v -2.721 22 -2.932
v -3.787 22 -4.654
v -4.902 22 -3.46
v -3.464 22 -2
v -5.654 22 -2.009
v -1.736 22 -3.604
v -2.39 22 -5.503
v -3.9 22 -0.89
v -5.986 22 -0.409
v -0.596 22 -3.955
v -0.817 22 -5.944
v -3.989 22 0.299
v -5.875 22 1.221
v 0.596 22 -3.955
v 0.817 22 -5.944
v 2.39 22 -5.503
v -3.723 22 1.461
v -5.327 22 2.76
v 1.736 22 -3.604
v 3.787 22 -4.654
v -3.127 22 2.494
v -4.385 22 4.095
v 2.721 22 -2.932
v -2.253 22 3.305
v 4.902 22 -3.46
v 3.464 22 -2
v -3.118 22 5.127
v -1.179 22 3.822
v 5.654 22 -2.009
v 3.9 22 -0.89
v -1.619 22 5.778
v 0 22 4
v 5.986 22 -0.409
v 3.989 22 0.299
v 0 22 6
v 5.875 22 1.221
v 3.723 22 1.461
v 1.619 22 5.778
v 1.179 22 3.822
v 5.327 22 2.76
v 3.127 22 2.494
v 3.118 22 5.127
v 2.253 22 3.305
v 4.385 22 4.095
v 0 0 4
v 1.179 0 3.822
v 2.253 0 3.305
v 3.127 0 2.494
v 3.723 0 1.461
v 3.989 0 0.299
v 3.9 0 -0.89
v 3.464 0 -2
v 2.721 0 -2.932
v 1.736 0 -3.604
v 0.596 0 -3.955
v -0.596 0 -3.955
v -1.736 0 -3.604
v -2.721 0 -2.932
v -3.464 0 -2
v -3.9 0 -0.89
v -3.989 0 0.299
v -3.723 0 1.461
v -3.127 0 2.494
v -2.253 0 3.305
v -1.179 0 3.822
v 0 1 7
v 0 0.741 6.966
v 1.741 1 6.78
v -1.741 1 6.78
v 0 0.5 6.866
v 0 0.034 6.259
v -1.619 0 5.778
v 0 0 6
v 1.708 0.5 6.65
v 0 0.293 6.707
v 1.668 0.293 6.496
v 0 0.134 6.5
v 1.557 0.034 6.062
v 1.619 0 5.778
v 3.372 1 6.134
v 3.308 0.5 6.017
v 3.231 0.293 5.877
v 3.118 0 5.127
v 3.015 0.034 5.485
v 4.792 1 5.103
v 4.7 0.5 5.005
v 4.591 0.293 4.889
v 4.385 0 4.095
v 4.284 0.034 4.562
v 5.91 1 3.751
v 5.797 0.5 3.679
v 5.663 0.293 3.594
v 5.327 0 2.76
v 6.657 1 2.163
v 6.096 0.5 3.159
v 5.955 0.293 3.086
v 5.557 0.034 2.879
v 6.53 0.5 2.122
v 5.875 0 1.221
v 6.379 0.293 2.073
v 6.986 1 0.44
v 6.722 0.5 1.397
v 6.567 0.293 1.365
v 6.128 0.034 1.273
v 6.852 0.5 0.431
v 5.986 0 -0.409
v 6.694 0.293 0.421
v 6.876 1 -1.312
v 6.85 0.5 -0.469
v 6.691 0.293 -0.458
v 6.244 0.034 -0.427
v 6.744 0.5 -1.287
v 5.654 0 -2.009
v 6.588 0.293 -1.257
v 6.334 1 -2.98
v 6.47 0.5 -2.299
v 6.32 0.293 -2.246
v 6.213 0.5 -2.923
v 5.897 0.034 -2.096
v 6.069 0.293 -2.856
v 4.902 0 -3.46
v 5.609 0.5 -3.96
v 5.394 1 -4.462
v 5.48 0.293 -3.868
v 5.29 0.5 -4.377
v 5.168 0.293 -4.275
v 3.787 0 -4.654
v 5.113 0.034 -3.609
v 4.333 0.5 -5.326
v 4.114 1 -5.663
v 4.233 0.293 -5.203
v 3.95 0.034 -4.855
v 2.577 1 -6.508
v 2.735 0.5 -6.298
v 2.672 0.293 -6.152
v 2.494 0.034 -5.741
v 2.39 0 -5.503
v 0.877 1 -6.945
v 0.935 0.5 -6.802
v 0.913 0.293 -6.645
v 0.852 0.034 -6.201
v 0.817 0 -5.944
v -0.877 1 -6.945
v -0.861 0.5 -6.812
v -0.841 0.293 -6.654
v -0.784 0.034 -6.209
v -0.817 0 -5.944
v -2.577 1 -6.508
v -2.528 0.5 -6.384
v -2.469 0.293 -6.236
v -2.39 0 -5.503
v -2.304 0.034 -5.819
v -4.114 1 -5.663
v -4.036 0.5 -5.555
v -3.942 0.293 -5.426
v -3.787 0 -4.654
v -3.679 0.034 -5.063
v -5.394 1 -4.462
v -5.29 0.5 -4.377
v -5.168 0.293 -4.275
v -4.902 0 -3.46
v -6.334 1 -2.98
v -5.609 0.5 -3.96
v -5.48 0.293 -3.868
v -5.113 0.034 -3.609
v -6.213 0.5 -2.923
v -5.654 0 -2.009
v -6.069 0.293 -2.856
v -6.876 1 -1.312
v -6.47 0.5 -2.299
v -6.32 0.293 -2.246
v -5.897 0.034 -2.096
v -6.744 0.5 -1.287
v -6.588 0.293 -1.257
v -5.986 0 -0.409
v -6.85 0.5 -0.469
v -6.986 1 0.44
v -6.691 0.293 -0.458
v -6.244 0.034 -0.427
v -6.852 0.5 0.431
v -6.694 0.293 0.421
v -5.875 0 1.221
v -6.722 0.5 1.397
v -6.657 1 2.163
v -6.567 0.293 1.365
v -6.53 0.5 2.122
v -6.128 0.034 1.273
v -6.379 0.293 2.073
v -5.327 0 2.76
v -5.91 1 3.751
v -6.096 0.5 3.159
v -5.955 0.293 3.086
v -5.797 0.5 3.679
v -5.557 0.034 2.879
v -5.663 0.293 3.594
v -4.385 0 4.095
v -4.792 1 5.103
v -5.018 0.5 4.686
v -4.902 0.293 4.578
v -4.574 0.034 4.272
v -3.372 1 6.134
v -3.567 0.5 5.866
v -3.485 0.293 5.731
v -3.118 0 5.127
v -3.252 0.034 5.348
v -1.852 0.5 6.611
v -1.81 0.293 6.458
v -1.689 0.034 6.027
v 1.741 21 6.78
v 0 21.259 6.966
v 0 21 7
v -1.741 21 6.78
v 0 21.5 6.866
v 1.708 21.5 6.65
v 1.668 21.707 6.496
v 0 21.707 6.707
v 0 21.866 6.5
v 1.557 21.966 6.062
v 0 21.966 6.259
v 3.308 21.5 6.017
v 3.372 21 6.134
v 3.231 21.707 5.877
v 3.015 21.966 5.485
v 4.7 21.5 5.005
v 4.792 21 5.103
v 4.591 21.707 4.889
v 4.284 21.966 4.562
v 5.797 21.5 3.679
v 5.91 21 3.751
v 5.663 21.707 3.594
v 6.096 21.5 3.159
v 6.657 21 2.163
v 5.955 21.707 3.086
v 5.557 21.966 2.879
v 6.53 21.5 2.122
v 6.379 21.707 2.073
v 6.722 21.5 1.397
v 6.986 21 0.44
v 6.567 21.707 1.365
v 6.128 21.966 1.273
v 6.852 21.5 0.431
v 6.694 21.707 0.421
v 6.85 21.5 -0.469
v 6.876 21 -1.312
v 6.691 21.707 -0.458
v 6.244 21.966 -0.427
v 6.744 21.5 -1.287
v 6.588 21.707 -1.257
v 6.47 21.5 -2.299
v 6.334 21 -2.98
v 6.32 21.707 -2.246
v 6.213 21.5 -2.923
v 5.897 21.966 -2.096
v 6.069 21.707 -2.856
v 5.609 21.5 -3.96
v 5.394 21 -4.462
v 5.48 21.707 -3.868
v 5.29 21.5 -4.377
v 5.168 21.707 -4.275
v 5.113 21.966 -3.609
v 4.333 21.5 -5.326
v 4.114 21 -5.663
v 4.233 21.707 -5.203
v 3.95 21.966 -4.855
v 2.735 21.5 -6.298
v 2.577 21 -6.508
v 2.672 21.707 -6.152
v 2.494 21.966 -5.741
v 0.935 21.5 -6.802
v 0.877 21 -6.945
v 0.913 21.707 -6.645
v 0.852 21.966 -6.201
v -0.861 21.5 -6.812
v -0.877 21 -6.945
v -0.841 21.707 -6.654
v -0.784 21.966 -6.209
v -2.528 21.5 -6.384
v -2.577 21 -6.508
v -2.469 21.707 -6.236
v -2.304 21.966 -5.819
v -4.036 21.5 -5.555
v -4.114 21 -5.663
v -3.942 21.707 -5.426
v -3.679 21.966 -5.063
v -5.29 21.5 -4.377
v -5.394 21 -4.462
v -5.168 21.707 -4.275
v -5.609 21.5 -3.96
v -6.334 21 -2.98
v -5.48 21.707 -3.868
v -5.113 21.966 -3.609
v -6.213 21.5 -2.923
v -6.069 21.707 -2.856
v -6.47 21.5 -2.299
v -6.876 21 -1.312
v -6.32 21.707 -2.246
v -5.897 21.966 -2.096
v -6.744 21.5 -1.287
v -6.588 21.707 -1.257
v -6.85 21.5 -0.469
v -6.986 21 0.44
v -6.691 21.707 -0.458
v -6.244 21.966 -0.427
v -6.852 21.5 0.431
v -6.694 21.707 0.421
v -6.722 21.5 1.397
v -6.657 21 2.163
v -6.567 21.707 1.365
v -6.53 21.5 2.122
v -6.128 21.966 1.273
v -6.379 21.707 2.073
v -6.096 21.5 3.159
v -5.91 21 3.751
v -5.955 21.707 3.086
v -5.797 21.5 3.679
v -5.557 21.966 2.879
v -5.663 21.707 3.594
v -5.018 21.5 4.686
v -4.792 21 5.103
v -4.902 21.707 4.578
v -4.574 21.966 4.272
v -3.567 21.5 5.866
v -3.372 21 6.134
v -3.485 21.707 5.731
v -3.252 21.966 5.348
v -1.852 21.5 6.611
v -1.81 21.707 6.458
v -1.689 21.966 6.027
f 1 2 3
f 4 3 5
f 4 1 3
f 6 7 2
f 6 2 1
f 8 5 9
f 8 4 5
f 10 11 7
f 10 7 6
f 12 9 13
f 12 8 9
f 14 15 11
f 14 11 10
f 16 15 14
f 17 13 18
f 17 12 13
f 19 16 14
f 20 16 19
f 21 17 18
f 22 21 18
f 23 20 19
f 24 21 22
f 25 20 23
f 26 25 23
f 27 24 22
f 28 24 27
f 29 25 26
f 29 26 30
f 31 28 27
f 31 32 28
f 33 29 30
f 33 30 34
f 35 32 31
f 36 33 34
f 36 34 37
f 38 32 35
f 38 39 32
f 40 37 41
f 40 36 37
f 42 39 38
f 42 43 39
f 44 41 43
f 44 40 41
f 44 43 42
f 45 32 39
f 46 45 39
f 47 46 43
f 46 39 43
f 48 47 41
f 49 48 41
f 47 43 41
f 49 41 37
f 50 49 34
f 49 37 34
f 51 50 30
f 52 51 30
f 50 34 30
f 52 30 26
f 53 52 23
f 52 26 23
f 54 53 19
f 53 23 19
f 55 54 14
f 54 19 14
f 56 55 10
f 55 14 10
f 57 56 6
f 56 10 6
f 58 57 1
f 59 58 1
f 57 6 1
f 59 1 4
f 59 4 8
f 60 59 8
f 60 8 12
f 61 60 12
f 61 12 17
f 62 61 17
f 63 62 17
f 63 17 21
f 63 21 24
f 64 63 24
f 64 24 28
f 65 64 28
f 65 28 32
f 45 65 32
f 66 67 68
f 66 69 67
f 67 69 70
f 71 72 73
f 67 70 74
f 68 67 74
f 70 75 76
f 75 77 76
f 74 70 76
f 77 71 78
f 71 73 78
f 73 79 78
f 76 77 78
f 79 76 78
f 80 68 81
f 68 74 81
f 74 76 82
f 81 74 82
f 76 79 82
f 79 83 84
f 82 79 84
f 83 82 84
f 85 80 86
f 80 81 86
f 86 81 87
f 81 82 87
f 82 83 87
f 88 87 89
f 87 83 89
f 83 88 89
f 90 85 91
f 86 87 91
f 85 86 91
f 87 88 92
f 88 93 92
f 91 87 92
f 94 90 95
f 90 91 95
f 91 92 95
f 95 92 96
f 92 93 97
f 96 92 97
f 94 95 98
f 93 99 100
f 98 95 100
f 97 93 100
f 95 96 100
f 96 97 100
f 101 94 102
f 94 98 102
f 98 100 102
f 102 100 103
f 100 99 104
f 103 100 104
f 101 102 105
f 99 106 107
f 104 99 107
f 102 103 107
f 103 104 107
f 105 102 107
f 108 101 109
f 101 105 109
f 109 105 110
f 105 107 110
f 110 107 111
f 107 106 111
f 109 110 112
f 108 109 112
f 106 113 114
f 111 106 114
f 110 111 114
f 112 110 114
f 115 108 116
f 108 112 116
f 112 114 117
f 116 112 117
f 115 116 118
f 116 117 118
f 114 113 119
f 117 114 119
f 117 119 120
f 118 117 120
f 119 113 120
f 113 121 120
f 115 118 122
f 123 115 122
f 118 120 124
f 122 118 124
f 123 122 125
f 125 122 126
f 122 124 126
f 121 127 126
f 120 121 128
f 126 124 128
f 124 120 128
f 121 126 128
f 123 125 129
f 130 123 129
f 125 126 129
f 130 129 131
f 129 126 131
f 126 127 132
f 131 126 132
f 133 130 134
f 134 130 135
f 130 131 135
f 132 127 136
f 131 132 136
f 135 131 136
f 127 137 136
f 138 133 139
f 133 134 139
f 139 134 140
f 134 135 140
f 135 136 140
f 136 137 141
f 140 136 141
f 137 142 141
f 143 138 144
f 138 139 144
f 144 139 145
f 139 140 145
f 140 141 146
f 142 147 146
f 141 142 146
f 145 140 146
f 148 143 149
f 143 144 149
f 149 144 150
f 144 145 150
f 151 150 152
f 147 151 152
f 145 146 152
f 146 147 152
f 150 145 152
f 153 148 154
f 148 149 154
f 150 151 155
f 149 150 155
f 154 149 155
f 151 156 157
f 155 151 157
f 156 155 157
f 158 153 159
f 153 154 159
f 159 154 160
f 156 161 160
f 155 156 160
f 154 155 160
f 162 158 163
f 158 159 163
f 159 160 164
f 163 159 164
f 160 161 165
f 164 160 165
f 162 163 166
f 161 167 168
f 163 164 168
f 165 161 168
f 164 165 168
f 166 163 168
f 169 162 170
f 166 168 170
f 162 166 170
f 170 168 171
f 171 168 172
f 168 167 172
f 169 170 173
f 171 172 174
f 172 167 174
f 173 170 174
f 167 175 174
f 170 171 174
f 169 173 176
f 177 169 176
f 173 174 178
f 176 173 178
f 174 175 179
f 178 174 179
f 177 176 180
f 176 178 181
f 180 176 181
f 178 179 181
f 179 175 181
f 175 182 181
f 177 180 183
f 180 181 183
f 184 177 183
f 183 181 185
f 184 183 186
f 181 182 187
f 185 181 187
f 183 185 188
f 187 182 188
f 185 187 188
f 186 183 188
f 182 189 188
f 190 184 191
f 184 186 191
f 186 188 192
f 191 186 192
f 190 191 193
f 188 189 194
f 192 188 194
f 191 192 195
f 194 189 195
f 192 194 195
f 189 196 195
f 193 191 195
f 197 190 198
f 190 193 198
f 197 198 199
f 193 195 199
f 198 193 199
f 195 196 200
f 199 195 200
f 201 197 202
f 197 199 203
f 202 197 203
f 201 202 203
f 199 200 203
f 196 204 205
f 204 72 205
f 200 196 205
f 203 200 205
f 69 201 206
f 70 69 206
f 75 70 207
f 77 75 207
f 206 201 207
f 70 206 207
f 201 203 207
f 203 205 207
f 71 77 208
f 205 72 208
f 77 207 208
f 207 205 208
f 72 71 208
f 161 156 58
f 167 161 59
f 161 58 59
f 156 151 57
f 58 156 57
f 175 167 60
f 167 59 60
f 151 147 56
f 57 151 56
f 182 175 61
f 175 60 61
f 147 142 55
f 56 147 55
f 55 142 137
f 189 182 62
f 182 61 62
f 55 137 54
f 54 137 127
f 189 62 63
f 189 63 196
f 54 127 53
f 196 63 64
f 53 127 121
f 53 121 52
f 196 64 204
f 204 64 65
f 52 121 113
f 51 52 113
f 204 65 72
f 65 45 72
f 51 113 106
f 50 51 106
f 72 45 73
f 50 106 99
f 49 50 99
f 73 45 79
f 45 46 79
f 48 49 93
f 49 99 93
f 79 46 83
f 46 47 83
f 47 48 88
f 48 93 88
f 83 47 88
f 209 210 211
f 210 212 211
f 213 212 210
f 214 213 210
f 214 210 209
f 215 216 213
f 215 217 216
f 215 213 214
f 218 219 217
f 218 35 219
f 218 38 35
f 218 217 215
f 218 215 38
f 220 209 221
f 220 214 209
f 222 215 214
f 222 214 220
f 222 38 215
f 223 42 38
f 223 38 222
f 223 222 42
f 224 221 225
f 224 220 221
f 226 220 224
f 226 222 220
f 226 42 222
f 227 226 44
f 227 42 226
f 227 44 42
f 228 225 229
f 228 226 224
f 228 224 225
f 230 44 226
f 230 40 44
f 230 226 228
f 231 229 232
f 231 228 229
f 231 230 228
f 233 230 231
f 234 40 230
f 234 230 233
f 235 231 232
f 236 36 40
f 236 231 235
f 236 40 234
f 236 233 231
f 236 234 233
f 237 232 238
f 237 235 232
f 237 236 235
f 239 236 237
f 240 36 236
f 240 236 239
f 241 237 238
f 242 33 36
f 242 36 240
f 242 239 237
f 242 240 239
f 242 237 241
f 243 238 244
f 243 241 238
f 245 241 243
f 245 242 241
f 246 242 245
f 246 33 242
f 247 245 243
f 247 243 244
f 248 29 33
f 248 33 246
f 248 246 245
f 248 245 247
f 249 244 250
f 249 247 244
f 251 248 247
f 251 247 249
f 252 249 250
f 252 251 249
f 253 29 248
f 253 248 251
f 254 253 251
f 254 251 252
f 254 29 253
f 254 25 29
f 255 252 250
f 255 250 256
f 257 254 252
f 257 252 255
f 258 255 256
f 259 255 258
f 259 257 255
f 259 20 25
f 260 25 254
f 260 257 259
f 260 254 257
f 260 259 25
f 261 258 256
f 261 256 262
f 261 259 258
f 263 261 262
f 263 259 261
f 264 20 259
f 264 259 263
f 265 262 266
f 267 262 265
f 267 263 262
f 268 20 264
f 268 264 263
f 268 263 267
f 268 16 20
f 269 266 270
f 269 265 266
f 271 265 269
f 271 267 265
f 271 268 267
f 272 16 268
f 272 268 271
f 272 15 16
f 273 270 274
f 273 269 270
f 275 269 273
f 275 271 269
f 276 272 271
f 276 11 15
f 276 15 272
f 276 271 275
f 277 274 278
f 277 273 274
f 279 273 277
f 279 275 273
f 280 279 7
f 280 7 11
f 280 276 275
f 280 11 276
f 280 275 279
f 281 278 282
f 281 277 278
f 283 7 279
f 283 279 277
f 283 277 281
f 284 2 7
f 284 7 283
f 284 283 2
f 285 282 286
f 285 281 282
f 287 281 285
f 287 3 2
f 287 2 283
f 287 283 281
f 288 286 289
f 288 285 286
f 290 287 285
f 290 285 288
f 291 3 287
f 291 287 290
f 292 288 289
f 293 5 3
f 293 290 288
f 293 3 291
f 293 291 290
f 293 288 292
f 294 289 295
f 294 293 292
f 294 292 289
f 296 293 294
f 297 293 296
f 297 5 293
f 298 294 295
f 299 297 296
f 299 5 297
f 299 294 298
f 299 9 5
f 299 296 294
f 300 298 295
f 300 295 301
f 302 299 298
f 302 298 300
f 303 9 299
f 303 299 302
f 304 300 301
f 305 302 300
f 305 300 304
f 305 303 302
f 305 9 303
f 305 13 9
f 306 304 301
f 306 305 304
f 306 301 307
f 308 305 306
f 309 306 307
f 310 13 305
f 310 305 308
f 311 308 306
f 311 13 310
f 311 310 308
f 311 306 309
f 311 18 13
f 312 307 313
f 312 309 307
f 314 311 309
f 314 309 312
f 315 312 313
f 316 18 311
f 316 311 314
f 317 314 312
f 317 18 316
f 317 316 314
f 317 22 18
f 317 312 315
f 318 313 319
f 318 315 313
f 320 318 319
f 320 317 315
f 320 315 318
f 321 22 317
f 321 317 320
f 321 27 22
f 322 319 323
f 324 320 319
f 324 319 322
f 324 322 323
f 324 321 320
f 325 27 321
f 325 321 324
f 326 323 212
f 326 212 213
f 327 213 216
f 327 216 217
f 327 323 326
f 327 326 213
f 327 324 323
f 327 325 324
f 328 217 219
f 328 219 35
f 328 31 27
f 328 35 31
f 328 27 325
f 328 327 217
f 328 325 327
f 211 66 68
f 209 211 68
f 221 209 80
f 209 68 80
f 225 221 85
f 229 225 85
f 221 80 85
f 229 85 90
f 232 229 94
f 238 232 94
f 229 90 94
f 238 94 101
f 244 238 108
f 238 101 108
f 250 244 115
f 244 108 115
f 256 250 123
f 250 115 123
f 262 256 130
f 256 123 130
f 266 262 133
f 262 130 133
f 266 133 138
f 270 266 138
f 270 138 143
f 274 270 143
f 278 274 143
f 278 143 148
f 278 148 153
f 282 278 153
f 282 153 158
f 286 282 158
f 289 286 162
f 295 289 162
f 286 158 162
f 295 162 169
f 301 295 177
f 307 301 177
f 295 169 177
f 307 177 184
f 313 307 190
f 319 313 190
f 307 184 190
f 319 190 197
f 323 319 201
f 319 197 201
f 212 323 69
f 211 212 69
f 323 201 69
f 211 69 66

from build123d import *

# Parameters (mm, degrees)
SKETCH1_R           = 7
BOSS_EXTRUDE1_DEPTH = 22
SKETCH2_R           = 4
CUT_EXTRUDE1_DEPTH  = 25.124676164
FILLET1_R           = 1
FILLET2_R           = 1


with BuildPart() as part:
    # Sketch1 → Boss-Extrude1 (new body)
    with BuildSketch(Plane(origin=(0, 0, 0), x_dir=(1, 0, 0), z_dir=(0, 1, 0))):
        with Locations(Location((0, 0, 0), (0, 0, 270))):
            Circle(SKETCH1_R)
    extrude(amount=BOSS_EXTRUDE1_DEPTH)

    # Sketch2 → Cut-Extrude1 (cut, through all)
    with BuildSketch(Plane(origin=(0, 22, 0), x_dir=(1, 0, 0), z_dir=(0, 1, 0))):
        with Locations(Location((0, 0, 0), (0, 0, 270))):
            Circle(SKETCH2_R)
    extrude(amount=-CUT_EXTRUDE1_DEPTH, mode=Mode.SUBTRACT)

    # Fillet1
    fillet1_edges = [part.edges().sort_by_distance(p)[0] for p in [
        (0, 22, -7),
    ]]
    fillet(fillet1_edges, radius=FILLET1_R)

    # Fillet2
    fillet2_edges = [part.edges().sort_by_distance(p)[0] for p in [
        (0, 0, -7),
    ]]
    fillet(fillet2_edges, radius=FILLET2_R)


solid = part.part
